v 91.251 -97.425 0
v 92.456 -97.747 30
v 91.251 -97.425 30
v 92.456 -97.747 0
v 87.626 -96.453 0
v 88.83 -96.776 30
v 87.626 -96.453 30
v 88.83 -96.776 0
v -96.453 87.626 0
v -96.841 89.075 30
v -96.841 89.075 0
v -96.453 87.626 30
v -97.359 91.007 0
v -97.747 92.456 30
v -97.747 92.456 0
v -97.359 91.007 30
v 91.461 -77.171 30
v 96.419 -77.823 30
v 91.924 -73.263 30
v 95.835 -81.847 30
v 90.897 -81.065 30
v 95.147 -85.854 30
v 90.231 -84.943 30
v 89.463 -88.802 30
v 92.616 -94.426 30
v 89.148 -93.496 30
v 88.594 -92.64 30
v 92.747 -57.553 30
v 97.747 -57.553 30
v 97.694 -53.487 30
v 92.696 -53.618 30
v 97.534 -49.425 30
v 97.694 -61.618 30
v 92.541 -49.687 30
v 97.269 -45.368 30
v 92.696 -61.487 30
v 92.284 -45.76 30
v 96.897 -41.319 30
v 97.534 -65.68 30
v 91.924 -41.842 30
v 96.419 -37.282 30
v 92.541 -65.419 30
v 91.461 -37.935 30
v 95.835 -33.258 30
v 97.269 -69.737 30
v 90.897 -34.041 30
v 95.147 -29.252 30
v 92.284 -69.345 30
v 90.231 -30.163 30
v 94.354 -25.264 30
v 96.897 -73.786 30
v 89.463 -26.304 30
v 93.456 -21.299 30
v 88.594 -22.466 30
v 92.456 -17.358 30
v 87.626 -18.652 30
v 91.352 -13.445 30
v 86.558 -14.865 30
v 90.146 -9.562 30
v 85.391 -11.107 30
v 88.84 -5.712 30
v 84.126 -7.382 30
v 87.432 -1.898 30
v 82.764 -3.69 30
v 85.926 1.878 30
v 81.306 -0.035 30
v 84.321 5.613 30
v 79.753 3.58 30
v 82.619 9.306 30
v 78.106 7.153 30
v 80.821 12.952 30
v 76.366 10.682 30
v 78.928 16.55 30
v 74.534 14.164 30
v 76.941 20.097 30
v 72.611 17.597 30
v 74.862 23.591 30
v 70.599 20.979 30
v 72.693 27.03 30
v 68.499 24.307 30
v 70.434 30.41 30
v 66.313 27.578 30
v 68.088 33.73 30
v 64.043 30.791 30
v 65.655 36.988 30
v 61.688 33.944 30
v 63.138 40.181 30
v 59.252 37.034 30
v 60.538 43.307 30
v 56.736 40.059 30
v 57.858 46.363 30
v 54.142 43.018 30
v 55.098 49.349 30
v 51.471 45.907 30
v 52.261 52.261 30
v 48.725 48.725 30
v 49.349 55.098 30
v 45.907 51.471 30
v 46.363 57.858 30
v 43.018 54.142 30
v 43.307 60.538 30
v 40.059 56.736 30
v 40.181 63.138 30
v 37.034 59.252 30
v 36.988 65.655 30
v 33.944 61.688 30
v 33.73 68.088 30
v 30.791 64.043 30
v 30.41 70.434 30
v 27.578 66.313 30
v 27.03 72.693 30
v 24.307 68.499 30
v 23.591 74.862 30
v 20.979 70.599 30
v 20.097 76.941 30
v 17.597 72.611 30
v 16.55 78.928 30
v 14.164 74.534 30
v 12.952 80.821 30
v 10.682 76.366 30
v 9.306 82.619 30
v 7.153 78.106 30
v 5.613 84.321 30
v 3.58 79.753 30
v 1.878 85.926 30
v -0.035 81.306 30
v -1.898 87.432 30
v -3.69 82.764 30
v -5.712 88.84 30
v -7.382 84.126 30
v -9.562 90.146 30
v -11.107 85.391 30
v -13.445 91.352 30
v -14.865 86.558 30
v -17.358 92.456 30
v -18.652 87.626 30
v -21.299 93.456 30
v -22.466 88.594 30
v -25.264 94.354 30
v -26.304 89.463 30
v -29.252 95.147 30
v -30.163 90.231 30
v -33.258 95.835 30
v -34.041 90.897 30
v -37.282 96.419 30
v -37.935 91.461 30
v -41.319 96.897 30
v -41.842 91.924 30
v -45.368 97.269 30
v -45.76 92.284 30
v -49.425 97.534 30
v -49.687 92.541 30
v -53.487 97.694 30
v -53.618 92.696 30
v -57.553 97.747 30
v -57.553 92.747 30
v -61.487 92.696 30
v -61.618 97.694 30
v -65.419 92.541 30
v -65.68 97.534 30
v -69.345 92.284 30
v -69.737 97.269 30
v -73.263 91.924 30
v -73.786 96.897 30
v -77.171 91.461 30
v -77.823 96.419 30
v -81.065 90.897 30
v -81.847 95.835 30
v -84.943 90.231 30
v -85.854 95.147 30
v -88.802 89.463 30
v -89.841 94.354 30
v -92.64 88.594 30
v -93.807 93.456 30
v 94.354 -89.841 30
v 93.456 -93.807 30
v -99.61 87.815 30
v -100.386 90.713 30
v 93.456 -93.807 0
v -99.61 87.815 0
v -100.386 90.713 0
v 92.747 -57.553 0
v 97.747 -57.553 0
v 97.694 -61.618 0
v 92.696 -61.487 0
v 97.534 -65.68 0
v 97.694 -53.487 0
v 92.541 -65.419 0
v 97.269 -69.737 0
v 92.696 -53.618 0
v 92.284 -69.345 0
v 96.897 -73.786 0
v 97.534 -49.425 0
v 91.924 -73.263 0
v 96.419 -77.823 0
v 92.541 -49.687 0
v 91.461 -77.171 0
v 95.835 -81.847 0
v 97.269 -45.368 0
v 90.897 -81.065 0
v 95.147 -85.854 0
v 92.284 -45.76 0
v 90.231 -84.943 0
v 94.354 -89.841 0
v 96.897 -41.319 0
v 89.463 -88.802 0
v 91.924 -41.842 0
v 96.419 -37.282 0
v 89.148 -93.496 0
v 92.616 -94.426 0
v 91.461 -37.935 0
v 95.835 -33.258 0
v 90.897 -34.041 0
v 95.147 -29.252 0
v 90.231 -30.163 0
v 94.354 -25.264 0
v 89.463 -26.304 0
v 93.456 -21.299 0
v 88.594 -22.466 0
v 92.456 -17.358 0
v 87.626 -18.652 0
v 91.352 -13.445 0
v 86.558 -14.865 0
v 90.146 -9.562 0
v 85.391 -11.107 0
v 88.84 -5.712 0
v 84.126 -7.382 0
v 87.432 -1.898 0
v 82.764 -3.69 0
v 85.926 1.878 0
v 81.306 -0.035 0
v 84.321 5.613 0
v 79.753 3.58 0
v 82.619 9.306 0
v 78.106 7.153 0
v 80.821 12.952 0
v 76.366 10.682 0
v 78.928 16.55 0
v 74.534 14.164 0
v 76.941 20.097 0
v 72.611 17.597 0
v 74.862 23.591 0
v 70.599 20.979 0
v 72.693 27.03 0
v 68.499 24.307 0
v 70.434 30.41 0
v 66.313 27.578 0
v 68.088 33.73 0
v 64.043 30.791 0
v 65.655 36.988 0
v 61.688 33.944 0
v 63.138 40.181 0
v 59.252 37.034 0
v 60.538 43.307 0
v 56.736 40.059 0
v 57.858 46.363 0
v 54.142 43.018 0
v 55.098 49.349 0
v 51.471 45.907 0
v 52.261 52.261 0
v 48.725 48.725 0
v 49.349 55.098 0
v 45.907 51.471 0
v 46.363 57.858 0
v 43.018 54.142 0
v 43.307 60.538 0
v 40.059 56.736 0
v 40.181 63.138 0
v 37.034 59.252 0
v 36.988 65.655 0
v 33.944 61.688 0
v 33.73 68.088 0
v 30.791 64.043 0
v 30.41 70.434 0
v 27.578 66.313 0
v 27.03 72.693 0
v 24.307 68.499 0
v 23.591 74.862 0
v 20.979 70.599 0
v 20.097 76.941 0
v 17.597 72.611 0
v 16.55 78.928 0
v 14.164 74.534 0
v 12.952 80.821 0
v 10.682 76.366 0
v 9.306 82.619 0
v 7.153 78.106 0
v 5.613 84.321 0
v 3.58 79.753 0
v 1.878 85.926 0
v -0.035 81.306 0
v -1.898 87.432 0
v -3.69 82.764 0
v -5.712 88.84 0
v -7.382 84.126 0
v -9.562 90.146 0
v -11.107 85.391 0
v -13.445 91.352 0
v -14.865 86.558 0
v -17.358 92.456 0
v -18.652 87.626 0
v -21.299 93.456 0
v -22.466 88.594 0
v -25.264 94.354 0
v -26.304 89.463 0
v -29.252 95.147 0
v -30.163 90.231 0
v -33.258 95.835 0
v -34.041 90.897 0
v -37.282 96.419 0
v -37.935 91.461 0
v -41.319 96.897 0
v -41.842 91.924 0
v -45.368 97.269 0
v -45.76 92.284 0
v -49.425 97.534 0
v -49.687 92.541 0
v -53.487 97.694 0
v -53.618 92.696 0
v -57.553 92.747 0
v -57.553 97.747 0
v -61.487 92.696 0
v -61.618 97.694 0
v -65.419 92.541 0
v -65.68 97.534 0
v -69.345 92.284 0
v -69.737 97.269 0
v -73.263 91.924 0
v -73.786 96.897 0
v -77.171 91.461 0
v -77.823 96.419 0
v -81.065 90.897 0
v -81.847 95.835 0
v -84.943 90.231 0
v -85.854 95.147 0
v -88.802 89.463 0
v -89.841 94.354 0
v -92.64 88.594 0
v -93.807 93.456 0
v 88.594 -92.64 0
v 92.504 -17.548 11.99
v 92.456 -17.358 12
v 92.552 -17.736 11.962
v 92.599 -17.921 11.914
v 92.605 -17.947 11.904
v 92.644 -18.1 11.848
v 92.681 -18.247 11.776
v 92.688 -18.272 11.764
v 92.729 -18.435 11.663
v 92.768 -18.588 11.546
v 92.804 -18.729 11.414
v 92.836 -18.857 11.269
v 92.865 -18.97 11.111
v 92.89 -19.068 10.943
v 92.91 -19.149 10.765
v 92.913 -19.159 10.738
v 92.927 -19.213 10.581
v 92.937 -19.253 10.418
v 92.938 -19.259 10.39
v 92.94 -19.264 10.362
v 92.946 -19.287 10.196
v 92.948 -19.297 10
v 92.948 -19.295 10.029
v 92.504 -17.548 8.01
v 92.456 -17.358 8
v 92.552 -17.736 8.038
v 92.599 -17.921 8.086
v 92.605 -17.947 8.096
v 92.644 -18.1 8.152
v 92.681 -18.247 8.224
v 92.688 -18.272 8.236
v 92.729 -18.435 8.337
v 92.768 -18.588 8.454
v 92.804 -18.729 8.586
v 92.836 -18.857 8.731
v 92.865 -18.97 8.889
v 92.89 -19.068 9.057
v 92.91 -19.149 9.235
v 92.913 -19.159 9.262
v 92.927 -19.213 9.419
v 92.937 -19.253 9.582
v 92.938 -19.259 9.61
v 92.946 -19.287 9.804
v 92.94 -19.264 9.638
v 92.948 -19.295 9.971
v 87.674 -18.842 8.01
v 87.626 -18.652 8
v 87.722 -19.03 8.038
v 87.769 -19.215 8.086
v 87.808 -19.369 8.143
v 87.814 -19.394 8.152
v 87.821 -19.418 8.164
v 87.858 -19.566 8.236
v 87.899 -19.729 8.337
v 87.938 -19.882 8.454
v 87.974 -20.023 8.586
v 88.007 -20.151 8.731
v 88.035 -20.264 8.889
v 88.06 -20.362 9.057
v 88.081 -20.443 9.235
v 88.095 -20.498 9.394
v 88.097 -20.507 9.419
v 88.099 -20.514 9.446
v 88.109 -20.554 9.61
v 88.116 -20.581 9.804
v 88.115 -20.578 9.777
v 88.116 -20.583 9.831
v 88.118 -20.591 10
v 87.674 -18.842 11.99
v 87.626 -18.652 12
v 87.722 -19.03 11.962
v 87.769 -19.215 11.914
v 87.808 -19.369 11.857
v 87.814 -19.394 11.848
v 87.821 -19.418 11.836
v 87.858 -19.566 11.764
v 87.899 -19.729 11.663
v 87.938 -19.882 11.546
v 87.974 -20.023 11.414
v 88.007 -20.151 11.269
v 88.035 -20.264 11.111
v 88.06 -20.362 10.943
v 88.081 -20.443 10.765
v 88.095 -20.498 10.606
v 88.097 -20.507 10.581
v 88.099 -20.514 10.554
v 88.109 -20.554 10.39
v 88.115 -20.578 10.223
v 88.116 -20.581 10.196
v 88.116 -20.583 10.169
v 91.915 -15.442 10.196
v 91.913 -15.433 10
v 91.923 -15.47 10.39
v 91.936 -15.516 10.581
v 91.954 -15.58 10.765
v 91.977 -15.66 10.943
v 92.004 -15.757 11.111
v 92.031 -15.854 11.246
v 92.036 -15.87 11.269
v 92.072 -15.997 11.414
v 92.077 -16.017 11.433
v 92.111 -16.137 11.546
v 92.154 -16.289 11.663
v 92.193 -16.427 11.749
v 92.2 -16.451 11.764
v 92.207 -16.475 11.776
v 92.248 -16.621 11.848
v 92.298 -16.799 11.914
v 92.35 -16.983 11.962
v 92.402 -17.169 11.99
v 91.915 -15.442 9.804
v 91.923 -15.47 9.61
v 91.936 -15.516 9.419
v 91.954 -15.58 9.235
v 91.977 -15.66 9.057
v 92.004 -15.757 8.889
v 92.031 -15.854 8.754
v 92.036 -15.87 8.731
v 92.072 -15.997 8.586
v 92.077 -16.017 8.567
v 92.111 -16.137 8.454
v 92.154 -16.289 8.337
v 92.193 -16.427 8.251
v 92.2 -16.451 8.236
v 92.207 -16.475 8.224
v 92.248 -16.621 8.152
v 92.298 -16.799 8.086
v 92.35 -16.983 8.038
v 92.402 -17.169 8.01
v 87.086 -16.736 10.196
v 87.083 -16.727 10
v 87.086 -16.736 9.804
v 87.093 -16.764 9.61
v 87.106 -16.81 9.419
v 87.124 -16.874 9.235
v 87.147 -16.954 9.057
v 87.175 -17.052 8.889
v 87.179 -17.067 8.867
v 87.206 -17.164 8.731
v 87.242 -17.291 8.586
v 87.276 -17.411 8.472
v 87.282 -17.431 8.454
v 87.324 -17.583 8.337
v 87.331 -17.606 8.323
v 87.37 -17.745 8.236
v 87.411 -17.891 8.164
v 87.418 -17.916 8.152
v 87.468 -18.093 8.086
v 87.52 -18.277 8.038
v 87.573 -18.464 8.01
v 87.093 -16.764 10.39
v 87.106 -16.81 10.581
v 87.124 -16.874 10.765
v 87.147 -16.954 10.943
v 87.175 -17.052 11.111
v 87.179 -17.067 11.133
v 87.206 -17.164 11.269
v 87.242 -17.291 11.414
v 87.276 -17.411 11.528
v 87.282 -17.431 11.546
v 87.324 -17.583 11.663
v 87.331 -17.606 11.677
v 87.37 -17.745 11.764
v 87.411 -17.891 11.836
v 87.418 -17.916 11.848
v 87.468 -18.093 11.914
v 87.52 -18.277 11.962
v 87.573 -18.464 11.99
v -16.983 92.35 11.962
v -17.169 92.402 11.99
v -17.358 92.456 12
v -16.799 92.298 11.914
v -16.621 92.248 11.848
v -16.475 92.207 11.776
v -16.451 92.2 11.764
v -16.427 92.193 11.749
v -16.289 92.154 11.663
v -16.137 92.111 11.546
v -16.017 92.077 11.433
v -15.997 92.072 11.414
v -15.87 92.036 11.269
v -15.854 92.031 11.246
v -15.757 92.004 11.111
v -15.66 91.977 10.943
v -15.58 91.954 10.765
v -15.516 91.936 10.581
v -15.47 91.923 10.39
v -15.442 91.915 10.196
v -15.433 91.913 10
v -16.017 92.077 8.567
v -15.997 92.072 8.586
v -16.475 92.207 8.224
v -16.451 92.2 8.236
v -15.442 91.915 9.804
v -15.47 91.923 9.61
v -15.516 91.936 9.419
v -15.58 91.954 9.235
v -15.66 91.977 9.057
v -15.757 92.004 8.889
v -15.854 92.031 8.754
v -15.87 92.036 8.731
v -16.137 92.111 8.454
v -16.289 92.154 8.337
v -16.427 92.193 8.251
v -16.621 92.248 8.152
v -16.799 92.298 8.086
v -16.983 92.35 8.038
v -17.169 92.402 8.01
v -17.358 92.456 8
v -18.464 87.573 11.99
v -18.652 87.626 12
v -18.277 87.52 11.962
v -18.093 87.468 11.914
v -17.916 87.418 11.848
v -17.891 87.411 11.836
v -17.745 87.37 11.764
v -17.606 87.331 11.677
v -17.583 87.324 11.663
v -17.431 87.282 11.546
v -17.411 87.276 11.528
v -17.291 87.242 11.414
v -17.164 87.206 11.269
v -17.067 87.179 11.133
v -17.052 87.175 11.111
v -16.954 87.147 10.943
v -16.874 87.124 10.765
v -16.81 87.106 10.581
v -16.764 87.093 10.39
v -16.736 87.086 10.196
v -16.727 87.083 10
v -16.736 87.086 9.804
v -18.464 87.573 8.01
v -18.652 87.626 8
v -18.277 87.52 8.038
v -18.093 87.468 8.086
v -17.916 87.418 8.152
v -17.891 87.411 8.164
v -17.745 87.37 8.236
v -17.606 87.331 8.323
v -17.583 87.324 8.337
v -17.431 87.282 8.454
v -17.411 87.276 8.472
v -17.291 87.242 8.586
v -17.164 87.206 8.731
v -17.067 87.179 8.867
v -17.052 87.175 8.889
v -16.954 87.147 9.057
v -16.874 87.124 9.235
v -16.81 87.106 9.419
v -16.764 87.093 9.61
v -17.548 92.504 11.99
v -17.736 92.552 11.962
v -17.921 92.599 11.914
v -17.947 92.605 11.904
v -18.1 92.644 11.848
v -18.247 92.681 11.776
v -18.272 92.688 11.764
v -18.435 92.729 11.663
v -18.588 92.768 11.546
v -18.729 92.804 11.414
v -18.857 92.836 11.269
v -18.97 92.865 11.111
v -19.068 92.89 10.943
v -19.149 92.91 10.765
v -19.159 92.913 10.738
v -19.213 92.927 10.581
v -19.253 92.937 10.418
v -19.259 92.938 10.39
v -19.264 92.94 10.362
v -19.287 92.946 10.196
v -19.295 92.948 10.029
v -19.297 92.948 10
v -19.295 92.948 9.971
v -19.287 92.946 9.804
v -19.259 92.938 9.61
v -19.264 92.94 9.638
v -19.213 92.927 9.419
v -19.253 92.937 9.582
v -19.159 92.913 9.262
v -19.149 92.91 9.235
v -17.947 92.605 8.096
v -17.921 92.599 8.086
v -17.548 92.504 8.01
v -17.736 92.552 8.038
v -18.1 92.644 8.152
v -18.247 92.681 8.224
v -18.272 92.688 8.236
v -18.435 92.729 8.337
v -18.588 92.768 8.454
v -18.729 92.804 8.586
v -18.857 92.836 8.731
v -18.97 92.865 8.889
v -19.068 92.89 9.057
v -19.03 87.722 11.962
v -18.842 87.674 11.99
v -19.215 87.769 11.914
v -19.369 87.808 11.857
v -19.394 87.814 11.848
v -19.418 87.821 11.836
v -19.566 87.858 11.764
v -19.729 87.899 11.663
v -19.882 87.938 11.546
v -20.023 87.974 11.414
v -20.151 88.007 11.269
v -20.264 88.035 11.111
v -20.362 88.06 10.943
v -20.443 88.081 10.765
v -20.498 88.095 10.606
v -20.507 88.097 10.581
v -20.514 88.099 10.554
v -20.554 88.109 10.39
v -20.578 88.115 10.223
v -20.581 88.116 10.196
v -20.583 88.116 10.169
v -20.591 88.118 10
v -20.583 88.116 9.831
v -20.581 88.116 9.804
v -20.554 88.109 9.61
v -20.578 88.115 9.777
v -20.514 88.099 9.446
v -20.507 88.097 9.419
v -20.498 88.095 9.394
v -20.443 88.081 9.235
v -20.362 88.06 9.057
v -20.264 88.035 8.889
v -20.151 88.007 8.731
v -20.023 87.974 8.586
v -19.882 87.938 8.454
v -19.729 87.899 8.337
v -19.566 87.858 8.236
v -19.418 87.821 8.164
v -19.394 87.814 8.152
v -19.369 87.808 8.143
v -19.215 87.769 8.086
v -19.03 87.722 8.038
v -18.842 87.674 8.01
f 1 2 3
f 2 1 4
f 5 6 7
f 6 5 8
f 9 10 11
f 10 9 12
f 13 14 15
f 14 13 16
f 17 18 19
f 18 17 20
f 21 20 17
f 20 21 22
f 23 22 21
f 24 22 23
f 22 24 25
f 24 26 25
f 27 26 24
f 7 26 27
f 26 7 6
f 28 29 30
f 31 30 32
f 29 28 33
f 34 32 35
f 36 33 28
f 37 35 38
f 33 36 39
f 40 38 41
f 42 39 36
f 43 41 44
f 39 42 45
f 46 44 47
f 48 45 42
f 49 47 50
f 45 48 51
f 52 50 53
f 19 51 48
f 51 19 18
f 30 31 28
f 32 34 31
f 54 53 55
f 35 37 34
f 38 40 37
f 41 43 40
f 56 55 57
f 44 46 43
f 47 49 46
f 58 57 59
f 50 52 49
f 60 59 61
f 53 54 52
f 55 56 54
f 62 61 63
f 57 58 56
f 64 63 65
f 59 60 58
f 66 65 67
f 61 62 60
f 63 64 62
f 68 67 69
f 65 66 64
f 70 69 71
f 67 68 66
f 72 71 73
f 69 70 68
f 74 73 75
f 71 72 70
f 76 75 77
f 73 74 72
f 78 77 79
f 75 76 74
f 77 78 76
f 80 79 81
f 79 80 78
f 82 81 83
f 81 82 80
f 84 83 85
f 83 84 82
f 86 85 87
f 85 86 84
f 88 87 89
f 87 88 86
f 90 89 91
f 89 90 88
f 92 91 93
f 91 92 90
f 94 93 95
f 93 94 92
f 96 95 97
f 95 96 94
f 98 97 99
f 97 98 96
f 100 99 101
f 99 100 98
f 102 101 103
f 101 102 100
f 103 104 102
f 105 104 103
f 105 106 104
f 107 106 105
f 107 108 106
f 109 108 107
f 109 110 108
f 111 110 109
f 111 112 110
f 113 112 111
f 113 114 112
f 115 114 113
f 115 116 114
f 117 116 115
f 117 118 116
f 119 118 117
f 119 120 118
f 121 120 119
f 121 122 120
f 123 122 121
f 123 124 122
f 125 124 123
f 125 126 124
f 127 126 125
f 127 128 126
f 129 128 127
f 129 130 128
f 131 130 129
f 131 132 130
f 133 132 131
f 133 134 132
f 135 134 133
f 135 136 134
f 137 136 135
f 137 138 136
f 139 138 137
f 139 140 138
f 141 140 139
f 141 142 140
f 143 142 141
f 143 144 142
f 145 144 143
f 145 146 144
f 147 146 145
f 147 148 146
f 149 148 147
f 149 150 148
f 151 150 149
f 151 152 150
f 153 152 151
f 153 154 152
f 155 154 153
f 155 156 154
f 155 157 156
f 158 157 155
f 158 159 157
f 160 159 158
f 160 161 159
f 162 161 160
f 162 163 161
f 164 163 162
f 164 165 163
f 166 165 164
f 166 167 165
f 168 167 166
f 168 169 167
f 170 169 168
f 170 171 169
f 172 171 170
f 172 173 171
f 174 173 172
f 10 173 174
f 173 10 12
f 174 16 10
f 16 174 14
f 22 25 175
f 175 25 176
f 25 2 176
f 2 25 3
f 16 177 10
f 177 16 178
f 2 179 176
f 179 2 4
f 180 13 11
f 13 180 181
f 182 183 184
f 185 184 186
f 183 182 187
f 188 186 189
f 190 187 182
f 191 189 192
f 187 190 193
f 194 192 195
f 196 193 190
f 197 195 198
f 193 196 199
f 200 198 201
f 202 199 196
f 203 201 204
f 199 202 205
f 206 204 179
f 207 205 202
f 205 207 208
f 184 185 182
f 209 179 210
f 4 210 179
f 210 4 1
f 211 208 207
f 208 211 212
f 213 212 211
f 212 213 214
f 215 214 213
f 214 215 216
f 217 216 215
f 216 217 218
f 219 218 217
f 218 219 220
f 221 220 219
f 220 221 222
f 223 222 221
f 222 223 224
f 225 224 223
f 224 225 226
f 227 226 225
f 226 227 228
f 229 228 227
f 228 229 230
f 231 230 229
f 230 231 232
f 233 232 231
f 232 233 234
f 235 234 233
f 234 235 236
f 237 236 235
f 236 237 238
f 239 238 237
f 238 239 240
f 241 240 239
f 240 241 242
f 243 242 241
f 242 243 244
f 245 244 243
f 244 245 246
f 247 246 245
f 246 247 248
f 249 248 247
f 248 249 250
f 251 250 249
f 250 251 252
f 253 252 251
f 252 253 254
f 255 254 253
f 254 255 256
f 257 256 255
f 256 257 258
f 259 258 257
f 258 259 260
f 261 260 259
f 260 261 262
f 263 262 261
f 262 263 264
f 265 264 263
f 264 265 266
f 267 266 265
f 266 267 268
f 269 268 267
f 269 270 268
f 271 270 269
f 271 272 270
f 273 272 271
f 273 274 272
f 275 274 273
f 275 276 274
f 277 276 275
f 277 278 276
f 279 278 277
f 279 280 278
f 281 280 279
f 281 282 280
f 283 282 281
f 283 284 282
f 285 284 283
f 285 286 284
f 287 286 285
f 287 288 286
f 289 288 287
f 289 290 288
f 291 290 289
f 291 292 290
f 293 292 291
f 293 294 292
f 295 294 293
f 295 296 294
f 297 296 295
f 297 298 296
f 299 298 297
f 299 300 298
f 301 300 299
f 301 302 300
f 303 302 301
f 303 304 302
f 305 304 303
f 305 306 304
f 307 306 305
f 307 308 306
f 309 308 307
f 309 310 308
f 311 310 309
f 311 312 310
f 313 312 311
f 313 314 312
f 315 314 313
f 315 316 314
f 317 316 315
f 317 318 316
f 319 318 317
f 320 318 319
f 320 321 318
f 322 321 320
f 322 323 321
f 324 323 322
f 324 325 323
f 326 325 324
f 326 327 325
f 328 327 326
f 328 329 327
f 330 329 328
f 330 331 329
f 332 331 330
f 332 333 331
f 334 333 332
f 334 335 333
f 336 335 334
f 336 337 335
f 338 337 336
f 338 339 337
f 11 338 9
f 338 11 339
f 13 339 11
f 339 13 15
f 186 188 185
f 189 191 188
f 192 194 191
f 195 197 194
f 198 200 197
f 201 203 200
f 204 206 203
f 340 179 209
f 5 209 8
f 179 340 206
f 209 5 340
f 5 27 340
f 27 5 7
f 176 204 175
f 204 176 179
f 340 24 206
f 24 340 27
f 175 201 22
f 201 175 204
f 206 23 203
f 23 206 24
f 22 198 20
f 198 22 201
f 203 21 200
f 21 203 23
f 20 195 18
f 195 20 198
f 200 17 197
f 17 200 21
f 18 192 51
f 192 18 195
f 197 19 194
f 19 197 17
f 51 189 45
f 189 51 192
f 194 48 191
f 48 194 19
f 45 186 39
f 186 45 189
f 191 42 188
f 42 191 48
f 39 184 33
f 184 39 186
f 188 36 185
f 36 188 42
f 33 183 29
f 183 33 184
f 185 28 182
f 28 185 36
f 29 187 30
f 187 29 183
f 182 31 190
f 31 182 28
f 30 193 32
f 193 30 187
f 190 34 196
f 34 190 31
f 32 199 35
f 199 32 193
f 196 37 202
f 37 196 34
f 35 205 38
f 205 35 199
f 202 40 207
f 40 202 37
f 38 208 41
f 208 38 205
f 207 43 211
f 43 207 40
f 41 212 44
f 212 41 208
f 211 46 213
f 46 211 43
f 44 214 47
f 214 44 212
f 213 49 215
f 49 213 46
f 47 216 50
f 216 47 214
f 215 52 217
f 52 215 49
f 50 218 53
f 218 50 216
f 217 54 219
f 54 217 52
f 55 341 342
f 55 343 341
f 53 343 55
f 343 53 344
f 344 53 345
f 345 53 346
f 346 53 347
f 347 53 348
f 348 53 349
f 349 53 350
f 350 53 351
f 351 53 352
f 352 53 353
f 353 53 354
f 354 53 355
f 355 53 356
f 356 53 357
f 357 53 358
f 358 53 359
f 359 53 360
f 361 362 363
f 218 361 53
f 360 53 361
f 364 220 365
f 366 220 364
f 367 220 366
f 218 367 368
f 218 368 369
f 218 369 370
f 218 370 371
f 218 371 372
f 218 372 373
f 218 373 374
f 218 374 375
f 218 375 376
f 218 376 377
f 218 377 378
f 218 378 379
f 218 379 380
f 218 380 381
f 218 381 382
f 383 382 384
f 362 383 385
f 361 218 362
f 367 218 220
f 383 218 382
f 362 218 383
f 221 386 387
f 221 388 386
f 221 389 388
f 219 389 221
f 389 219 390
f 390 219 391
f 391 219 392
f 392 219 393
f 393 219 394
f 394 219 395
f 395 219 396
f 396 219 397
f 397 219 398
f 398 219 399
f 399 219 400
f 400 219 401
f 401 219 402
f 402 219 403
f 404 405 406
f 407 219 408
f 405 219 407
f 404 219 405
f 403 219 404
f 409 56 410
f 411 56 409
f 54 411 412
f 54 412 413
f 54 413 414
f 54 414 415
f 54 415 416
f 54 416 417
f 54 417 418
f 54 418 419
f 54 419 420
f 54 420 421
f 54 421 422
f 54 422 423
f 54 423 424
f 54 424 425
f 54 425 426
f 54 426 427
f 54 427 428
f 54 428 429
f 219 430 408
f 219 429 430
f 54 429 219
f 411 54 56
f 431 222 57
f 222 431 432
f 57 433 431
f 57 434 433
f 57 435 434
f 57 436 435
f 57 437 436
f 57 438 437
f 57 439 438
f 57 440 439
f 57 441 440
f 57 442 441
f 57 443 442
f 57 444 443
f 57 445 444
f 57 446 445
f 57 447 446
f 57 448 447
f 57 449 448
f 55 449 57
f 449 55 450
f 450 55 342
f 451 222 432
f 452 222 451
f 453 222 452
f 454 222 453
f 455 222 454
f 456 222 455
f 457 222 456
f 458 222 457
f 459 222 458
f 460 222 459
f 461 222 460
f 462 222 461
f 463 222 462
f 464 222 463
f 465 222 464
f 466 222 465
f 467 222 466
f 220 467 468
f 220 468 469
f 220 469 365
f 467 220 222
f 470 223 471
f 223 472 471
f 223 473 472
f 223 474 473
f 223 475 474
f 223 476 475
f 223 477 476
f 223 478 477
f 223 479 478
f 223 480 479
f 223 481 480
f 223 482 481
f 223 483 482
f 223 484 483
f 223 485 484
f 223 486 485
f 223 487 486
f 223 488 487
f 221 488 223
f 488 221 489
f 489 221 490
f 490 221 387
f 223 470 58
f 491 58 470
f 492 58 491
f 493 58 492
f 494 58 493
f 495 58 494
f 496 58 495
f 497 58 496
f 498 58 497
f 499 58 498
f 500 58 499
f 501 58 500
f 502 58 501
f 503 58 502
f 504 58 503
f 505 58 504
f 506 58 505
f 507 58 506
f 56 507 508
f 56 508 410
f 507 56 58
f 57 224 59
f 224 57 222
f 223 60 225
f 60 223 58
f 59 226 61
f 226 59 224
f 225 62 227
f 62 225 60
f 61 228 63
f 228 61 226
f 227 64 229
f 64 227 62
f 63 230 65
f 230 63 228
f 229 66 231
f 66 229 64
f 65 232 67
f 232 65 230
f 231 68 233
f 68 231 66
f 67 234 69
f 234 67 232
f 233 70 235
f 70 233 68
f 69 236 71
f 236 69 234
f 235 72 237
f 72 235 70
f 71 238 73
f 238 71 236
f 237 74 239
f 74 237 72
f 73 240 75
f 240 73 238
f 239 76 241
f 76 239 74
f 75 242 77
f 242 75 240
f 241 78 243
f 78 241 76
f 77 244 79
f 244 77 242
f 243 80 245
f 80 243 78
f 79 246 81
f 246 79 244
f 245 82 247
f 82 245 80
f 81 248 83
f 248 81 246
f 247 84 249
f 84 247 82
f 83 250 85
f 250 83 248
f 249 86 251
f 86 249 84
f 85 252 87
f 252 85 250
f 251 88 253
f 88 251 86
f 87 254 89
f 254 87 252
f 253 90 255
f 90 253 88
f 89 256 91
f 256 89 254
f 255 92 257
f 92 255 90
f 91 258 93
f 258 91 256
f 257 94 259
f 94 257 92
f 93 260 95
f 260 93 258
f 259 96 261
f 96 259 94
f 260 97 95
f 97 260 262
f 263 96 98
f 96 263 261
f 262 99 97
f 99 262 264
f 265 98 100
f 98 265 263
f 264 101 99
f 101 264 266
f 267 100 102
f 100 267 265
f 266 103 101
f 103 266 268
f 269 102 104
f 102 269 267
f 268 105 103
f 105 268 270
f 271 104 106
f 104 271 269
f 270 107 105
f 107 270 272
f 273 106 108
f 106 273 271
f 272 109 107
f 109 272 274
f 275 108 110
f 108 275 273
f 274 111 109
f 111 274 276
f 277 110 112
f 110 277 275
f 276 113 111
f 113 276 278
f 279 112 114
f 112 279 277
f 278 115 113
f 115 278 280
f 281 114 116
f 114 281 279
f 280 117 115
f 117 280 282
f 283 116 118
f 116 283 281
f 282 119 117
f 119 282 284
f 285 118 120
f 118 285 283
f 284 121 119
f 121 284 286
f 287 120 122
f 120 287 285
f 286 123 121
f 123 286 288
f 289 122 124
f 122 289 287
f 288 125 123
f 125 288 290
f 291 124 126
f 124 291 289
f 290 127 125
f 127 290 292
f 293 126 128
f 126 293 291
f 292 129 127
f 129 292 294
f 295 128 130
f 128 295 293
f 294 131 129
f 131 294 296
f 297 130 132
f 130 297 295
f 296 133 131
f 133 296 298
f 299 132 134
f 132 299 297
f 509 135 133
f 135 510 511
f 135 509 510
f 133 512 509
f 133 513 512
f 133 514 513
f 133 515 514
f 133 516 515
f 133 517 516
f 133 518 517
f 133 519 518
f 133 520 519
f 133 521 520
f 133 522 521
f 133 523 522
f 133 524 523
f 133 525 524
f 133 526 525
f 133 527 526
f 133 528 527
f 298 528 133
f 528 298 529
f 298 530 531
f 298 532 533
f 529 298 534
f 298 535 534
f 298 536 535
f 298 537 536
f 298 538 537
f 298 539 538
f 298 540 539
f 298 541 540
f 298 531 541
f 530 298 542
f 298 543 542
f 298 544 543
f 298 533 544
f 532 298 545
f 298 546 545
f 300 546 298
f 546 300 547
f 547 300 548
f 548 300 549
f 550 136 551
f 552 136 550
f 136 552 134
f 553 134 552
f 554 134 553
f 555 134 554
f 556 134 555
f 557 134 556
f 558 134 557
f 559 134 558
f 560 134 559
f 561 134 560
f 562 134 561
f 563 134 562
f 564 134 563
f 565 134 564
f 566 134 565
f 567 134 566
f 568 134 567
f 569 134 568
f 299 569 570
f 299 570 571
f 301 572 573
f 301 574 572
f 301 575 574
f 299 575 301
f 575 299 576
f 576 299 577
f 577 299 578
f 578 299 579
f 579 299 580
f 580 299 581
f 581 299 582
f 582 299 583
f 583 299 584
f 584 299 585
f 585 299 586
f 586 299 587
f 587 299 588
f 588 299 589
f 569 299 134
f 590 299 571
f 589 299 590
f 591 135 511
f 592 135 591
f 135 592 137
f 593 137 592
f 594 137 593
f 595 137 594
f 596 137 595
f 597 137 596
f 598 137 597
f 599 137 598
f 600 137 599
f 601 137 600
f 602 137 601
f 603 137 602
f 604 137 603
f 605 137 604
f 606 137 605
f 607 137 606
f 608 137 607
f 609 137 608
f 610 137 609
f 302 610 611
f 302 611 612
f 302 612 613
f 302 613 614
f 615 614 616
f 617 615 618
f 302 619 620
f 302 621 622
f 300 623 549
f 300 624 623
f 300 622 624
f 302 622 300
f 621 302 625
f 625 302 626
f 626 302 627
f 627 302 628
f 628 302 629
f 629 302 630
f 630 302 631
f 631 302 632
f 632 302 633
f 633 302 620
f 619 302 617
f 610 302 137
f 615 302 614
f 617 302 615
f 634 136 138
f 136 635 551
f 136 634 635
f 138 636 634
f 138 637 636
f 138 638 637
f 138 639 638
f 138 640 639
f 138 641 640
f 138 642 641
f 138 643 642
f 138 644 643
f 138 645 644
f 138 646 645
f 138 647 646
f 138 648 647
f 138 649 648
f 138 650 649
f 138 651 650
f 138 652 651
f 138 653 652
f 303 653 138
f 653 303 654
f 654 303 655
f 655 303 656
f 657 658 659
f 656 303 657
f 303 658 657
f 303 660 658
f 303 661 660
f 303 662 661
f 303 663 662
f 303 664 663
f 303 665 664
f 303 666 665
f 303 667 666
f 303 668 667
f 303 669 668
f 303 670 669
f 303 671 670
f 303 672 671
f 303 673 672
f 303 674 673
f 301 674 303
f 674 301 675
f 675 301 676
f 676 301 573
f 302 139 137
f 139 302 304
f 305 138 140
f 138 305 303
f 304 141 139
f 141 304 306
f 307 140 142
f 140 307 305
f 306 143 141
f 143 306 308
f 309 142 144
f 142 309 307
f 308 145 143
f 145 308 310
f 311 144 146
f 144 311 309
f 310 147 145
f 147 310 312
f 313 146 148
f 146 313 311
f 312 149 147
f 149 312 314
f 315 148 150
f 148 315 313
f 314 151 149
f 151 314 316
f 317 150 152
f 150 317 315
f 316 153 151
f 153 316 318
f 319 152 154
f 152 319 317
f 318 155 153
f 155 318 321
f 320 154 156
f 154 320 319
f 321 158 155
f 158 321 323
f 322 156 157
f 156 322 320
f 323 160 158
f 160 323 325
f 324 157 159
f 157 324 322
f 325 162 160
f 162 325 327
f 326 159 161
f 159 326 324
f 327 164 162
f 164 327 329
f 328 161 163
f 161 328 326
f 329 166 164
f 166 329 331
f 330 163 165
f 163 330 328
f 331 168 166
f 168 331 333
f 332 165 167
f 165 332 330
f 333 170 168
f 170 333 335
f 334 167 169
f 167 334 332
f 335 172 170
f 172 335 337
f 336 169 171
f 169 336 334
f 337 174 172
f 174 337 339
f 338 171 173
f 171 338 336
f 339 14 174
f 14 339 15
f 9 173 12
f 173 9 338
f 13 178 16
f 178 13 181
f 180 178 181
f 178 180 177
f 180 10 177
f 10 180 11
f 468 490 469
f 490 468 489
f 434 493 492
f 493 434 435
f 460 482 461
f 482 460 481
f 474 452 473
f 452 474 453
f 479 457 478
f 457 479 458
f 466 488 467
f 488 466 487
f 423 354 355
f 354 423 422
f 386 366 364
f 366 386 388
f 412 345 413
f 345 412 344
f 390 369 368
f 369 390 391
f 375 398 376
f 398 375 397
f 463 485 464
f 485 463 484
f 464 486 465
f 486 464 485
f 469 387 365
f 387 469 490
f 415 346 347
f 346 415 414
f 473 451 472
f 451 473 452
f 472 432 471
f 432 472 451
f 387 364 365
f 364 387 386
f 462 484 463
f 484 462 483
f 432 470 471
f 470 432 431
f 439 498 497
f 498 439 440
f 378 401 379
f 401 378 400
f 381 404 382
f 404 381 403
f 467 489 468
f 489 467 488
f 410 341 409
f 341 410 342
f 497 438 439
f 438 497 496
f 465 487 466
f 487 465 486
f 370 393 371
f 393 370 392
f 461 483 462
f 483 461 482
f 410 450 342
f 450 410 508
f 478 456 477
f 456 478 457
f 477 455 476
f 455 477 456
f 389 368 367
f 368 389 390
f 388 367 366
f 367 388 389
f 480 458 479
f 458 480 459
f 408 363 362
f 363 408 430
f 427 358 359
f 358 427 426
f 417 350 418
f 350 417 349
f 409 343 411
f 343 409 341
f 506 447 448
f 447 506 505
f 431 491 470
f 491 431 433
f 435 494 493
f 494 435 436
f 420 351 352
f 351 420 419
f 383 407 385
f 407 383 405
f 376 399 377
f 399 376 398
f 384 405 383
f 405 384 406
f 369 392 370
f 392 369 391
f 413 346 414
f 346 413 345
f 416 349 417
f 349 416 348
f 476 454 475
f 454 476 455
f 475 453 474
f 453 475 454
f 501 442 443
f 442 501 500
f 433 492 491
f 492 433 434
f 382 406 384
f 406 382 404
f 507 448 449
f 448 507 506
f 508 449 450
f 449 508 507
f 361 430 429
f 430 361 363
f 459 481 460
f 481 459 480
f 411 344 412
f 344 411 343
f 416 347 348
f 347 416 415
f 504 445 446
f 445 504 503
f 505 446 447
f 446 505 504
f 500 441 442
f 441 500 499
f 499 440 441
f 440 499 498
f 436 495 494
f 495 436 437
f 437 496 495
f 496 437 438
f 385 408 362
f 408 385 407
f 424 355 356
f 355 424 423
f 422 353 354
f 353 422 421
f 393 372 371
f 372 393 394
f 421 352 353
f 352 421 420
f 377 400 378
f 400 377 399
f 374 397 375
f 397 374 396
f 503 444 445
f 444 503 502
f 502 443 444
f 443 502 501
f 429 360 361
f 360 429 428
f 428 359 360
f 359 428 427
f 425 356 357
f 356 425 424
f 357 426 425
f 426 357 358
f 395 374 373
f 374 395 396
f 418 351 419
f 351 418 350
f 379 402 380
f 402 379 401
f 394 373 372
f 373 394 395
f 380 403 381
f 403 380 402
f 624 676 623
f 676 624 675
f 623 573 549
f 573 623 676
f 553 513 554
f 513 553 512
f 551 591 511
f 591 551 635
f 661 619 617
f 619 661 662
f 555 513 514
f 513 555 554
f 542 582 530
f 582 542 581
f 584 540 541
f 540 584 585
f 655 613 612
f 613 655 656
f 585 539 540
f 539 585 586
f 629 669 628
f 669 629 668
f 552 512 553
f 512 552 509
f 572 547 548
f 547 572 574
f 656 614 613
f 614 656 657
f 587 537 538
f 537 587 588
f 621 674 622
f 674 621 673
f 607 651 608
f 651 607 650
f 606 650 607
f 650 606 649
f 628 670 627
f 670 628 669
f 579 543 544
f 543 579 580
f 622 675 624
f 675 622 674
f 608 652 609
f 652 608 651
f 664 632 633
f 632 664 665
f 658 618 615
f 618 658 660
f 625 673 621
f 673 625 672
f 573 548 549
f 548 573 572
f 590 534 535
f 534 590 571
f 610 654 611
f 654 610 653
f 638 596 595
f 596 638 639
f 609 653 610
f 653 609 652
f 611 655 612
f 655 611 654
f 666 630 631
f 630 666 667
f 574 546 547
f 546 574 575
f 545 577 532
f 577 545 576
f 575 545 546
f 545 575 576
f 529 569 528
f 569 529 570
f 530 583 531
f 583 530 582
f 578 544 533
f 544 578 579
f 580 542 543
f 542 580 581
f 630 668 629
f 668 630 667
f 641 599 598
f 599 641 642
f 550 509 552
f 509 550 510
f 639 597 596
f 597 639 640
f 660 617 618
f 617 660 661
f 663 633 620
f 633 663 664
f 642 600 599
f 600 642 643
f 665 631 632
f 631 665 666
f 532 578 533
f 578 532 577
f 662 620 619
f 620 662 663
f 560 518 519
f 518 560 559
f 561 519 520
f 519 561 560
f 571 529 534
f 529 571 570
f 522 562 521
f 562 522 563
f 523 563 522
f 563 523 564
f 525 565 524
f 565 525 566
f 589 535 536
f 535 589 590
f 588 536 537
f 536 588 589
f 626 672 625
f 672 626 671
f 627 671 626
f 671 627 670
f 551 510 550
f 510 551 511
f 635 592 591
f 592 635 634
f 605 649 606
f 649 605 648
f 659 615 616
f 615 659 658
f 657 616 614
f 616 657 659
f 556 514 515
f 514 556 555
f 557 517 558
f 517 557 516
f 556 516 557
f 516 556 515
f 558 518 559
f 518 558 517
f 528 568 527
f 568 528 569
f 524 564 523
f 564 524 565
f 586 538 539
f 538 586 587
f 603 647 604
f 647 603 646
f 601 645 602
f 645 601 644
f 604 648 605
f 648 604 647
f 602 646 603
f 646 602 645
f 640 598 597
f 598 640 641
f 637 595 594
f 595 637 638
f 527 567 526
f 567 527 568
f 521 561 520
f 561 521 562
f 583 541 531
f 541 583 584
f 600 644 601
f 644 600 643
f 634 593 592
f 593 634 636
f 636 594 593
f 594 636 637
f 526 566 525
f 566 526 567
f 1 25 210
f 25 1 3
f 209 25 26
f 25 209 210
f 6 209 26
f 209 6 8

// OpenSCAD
// φ300 mm丸板に側面からネジ止めする外周リング。単位: mm
// 内径300.6 mmで、丸板との径方向の隙間は片側0.3 mm。
// 同一の120度パーツを3個印刷し、それぞれ丸板に固定する。
// 両端の蟻継ぎを上下にスライドして接続する。
// 底面z=0を丸板の底面に揃える。横穴の中心高さは10 mm。
// 穴径4 mmは仮設定。使用するネジの軸径に合わせて変更する。
// CLI: openscad -o outer_board_rim_segment.stl outer_board_rim.scad

$fn = 240;
inner_diameter = 300.6;
wall_thickness = 5;
rim_height = 30;
screw_hole_diameter = 4;
screw_hole_height = 10;
segment_count = 3;

// 5 mmの壁内に収めた蟻継ぎ。凹側は各方向へ0.25 mm広げる。
joint_clearance = 0.25;
joint_depth = 3;
joint_neck_width = 2;
joint_head_width = 3;

// 指定内径に追加する径方向の片側すき間。0なら内径300.6 mm。
radial_clearance = 0;
// "segment": 印刷用 / "assembly": 組立 / "preview": 丸板付き
render_part = "segment";
board_diameter = 300;
board_thickness = 18;

inner_radius = inner_diameter / 2 + radial_clearance;
outer_radius = inner_radius + wall_thickness;
segment_angle = 360 / segment_count;
joint_radius = (inner_radius + outer_radius) / 2;

assert(segment_count == 3, "This part uses three 120-degree segments");
assert(inner_diameter > 0 && wall_thickness > 0 && rim_height > 0);
assert(radial_clearance >= 0);
assert(joint_clearance >= 0 && joint_depth > 0);
assert(joint_neck_width > 0 && joint_head_width > joint_neck_width);
assert(joint_radius - joint_head_width / 2 - joint_clearance > inner_radius
    && sqrt(pow(joint_radius + joint_head_width / 2, 2)
          + pow(joint_depth, 2)) + joint_clearance < outer_radius,
    "Dovetail sockets must leave material on both sides of the wall");
assert(screw_hole_diameter > 0);
assert(screw_hole_height > screw_hole_diameter / 2
    && screw_hole_height + screw_hole_diameter / 2 < rim_height,
    "Screw holes must fit within the wall height");

module joint_prism(angle, clearance = 0) {
    rotate([0, 0, angle])
        translate([joint_radius, 0, 0])
            linear_extrude(height = rim_height)
                offset(delta = clearance)
                    polygon([
                        [-joint_neck_width / 2, -1],
                        [ joint_neck_width / 2, -1],
                        [ joint_neck_width / 2, 0],
                        [ joint_head_width / 2, joint_depth],
                        [-joint_head_width / 2, joint_depth],
                        [-joint_neck_width / 2, 0]
                    ]);
}

module rim_segment() {
    difference() {
        union() {
            rotate([0, 0, -segment_angle / 2])
                rotate_extrude(angle = segment_angle, convexity = 10)
                    translate([inner_radius, 0])
                        square([wall_thickness, rim_height]);
            joint_prism(segment_angle / 2);
        }

        // 反対側の端に、隣のパーツの凸部が入る凹部を設ける。
        translate([0, 0, -1])
            linear_extrude(height = rim_height + 2)
                projection(cut = false)
                    joint_prism(-segment_angle / 2, joint_clearance);

        // 円の中心へ向く水平の貫通穴。端面から各30度の位置。
        for (angle = [-segment_angle / 4, segment_angle / 4])
            rotate([0, 0, angle])
                translate([inner_radius - 1, 0, screw_hole_height])
                    rotate([0, 90, 0])
                        cylinder(h = wall_thickness + 2,
                                 d = screw_hole_diameter, $fn = 64);
    }
}

module assembly() {
    for (i = [0 : segment_count - 1])
        color(i % 2 == 0 ? "darkorange" : "gold")
            rotate([0, 0, i * segment_angle]) rim_segment();
}

if (render_part == "segment") {
    // 45度回転し、XYの中央付近へ移動。底面はz=0。
    shift = -(outer_radius + outer_radius * cos(105)) / 2;
    translate([shift, shift, 0]) rotate([0, 0, 45]) rim_segment();
} else if (render_part == "assembly") {
    assembly();
} else if (render_part == "preview") {
    assembly();
    %color([0.58, 0.36, 0.18, 0.5])
        cylinder(d = board_diameter, h = board_thickness);
} else {
    assert(false, "render_part must be segment, assembly or preview");
}

echo(str("Inner diameter: ", inner_radius * 2, " mm"));
echo(str("Outer diameter: ", outer_radius * 2, " mm"));
echo(str("Height: ", rim_height, " mm"));
echo(str("Horizontal screw holes: diameter ", screw_hole_diameter,
         " mm, center height ", screw_hole_height, " mm"));
